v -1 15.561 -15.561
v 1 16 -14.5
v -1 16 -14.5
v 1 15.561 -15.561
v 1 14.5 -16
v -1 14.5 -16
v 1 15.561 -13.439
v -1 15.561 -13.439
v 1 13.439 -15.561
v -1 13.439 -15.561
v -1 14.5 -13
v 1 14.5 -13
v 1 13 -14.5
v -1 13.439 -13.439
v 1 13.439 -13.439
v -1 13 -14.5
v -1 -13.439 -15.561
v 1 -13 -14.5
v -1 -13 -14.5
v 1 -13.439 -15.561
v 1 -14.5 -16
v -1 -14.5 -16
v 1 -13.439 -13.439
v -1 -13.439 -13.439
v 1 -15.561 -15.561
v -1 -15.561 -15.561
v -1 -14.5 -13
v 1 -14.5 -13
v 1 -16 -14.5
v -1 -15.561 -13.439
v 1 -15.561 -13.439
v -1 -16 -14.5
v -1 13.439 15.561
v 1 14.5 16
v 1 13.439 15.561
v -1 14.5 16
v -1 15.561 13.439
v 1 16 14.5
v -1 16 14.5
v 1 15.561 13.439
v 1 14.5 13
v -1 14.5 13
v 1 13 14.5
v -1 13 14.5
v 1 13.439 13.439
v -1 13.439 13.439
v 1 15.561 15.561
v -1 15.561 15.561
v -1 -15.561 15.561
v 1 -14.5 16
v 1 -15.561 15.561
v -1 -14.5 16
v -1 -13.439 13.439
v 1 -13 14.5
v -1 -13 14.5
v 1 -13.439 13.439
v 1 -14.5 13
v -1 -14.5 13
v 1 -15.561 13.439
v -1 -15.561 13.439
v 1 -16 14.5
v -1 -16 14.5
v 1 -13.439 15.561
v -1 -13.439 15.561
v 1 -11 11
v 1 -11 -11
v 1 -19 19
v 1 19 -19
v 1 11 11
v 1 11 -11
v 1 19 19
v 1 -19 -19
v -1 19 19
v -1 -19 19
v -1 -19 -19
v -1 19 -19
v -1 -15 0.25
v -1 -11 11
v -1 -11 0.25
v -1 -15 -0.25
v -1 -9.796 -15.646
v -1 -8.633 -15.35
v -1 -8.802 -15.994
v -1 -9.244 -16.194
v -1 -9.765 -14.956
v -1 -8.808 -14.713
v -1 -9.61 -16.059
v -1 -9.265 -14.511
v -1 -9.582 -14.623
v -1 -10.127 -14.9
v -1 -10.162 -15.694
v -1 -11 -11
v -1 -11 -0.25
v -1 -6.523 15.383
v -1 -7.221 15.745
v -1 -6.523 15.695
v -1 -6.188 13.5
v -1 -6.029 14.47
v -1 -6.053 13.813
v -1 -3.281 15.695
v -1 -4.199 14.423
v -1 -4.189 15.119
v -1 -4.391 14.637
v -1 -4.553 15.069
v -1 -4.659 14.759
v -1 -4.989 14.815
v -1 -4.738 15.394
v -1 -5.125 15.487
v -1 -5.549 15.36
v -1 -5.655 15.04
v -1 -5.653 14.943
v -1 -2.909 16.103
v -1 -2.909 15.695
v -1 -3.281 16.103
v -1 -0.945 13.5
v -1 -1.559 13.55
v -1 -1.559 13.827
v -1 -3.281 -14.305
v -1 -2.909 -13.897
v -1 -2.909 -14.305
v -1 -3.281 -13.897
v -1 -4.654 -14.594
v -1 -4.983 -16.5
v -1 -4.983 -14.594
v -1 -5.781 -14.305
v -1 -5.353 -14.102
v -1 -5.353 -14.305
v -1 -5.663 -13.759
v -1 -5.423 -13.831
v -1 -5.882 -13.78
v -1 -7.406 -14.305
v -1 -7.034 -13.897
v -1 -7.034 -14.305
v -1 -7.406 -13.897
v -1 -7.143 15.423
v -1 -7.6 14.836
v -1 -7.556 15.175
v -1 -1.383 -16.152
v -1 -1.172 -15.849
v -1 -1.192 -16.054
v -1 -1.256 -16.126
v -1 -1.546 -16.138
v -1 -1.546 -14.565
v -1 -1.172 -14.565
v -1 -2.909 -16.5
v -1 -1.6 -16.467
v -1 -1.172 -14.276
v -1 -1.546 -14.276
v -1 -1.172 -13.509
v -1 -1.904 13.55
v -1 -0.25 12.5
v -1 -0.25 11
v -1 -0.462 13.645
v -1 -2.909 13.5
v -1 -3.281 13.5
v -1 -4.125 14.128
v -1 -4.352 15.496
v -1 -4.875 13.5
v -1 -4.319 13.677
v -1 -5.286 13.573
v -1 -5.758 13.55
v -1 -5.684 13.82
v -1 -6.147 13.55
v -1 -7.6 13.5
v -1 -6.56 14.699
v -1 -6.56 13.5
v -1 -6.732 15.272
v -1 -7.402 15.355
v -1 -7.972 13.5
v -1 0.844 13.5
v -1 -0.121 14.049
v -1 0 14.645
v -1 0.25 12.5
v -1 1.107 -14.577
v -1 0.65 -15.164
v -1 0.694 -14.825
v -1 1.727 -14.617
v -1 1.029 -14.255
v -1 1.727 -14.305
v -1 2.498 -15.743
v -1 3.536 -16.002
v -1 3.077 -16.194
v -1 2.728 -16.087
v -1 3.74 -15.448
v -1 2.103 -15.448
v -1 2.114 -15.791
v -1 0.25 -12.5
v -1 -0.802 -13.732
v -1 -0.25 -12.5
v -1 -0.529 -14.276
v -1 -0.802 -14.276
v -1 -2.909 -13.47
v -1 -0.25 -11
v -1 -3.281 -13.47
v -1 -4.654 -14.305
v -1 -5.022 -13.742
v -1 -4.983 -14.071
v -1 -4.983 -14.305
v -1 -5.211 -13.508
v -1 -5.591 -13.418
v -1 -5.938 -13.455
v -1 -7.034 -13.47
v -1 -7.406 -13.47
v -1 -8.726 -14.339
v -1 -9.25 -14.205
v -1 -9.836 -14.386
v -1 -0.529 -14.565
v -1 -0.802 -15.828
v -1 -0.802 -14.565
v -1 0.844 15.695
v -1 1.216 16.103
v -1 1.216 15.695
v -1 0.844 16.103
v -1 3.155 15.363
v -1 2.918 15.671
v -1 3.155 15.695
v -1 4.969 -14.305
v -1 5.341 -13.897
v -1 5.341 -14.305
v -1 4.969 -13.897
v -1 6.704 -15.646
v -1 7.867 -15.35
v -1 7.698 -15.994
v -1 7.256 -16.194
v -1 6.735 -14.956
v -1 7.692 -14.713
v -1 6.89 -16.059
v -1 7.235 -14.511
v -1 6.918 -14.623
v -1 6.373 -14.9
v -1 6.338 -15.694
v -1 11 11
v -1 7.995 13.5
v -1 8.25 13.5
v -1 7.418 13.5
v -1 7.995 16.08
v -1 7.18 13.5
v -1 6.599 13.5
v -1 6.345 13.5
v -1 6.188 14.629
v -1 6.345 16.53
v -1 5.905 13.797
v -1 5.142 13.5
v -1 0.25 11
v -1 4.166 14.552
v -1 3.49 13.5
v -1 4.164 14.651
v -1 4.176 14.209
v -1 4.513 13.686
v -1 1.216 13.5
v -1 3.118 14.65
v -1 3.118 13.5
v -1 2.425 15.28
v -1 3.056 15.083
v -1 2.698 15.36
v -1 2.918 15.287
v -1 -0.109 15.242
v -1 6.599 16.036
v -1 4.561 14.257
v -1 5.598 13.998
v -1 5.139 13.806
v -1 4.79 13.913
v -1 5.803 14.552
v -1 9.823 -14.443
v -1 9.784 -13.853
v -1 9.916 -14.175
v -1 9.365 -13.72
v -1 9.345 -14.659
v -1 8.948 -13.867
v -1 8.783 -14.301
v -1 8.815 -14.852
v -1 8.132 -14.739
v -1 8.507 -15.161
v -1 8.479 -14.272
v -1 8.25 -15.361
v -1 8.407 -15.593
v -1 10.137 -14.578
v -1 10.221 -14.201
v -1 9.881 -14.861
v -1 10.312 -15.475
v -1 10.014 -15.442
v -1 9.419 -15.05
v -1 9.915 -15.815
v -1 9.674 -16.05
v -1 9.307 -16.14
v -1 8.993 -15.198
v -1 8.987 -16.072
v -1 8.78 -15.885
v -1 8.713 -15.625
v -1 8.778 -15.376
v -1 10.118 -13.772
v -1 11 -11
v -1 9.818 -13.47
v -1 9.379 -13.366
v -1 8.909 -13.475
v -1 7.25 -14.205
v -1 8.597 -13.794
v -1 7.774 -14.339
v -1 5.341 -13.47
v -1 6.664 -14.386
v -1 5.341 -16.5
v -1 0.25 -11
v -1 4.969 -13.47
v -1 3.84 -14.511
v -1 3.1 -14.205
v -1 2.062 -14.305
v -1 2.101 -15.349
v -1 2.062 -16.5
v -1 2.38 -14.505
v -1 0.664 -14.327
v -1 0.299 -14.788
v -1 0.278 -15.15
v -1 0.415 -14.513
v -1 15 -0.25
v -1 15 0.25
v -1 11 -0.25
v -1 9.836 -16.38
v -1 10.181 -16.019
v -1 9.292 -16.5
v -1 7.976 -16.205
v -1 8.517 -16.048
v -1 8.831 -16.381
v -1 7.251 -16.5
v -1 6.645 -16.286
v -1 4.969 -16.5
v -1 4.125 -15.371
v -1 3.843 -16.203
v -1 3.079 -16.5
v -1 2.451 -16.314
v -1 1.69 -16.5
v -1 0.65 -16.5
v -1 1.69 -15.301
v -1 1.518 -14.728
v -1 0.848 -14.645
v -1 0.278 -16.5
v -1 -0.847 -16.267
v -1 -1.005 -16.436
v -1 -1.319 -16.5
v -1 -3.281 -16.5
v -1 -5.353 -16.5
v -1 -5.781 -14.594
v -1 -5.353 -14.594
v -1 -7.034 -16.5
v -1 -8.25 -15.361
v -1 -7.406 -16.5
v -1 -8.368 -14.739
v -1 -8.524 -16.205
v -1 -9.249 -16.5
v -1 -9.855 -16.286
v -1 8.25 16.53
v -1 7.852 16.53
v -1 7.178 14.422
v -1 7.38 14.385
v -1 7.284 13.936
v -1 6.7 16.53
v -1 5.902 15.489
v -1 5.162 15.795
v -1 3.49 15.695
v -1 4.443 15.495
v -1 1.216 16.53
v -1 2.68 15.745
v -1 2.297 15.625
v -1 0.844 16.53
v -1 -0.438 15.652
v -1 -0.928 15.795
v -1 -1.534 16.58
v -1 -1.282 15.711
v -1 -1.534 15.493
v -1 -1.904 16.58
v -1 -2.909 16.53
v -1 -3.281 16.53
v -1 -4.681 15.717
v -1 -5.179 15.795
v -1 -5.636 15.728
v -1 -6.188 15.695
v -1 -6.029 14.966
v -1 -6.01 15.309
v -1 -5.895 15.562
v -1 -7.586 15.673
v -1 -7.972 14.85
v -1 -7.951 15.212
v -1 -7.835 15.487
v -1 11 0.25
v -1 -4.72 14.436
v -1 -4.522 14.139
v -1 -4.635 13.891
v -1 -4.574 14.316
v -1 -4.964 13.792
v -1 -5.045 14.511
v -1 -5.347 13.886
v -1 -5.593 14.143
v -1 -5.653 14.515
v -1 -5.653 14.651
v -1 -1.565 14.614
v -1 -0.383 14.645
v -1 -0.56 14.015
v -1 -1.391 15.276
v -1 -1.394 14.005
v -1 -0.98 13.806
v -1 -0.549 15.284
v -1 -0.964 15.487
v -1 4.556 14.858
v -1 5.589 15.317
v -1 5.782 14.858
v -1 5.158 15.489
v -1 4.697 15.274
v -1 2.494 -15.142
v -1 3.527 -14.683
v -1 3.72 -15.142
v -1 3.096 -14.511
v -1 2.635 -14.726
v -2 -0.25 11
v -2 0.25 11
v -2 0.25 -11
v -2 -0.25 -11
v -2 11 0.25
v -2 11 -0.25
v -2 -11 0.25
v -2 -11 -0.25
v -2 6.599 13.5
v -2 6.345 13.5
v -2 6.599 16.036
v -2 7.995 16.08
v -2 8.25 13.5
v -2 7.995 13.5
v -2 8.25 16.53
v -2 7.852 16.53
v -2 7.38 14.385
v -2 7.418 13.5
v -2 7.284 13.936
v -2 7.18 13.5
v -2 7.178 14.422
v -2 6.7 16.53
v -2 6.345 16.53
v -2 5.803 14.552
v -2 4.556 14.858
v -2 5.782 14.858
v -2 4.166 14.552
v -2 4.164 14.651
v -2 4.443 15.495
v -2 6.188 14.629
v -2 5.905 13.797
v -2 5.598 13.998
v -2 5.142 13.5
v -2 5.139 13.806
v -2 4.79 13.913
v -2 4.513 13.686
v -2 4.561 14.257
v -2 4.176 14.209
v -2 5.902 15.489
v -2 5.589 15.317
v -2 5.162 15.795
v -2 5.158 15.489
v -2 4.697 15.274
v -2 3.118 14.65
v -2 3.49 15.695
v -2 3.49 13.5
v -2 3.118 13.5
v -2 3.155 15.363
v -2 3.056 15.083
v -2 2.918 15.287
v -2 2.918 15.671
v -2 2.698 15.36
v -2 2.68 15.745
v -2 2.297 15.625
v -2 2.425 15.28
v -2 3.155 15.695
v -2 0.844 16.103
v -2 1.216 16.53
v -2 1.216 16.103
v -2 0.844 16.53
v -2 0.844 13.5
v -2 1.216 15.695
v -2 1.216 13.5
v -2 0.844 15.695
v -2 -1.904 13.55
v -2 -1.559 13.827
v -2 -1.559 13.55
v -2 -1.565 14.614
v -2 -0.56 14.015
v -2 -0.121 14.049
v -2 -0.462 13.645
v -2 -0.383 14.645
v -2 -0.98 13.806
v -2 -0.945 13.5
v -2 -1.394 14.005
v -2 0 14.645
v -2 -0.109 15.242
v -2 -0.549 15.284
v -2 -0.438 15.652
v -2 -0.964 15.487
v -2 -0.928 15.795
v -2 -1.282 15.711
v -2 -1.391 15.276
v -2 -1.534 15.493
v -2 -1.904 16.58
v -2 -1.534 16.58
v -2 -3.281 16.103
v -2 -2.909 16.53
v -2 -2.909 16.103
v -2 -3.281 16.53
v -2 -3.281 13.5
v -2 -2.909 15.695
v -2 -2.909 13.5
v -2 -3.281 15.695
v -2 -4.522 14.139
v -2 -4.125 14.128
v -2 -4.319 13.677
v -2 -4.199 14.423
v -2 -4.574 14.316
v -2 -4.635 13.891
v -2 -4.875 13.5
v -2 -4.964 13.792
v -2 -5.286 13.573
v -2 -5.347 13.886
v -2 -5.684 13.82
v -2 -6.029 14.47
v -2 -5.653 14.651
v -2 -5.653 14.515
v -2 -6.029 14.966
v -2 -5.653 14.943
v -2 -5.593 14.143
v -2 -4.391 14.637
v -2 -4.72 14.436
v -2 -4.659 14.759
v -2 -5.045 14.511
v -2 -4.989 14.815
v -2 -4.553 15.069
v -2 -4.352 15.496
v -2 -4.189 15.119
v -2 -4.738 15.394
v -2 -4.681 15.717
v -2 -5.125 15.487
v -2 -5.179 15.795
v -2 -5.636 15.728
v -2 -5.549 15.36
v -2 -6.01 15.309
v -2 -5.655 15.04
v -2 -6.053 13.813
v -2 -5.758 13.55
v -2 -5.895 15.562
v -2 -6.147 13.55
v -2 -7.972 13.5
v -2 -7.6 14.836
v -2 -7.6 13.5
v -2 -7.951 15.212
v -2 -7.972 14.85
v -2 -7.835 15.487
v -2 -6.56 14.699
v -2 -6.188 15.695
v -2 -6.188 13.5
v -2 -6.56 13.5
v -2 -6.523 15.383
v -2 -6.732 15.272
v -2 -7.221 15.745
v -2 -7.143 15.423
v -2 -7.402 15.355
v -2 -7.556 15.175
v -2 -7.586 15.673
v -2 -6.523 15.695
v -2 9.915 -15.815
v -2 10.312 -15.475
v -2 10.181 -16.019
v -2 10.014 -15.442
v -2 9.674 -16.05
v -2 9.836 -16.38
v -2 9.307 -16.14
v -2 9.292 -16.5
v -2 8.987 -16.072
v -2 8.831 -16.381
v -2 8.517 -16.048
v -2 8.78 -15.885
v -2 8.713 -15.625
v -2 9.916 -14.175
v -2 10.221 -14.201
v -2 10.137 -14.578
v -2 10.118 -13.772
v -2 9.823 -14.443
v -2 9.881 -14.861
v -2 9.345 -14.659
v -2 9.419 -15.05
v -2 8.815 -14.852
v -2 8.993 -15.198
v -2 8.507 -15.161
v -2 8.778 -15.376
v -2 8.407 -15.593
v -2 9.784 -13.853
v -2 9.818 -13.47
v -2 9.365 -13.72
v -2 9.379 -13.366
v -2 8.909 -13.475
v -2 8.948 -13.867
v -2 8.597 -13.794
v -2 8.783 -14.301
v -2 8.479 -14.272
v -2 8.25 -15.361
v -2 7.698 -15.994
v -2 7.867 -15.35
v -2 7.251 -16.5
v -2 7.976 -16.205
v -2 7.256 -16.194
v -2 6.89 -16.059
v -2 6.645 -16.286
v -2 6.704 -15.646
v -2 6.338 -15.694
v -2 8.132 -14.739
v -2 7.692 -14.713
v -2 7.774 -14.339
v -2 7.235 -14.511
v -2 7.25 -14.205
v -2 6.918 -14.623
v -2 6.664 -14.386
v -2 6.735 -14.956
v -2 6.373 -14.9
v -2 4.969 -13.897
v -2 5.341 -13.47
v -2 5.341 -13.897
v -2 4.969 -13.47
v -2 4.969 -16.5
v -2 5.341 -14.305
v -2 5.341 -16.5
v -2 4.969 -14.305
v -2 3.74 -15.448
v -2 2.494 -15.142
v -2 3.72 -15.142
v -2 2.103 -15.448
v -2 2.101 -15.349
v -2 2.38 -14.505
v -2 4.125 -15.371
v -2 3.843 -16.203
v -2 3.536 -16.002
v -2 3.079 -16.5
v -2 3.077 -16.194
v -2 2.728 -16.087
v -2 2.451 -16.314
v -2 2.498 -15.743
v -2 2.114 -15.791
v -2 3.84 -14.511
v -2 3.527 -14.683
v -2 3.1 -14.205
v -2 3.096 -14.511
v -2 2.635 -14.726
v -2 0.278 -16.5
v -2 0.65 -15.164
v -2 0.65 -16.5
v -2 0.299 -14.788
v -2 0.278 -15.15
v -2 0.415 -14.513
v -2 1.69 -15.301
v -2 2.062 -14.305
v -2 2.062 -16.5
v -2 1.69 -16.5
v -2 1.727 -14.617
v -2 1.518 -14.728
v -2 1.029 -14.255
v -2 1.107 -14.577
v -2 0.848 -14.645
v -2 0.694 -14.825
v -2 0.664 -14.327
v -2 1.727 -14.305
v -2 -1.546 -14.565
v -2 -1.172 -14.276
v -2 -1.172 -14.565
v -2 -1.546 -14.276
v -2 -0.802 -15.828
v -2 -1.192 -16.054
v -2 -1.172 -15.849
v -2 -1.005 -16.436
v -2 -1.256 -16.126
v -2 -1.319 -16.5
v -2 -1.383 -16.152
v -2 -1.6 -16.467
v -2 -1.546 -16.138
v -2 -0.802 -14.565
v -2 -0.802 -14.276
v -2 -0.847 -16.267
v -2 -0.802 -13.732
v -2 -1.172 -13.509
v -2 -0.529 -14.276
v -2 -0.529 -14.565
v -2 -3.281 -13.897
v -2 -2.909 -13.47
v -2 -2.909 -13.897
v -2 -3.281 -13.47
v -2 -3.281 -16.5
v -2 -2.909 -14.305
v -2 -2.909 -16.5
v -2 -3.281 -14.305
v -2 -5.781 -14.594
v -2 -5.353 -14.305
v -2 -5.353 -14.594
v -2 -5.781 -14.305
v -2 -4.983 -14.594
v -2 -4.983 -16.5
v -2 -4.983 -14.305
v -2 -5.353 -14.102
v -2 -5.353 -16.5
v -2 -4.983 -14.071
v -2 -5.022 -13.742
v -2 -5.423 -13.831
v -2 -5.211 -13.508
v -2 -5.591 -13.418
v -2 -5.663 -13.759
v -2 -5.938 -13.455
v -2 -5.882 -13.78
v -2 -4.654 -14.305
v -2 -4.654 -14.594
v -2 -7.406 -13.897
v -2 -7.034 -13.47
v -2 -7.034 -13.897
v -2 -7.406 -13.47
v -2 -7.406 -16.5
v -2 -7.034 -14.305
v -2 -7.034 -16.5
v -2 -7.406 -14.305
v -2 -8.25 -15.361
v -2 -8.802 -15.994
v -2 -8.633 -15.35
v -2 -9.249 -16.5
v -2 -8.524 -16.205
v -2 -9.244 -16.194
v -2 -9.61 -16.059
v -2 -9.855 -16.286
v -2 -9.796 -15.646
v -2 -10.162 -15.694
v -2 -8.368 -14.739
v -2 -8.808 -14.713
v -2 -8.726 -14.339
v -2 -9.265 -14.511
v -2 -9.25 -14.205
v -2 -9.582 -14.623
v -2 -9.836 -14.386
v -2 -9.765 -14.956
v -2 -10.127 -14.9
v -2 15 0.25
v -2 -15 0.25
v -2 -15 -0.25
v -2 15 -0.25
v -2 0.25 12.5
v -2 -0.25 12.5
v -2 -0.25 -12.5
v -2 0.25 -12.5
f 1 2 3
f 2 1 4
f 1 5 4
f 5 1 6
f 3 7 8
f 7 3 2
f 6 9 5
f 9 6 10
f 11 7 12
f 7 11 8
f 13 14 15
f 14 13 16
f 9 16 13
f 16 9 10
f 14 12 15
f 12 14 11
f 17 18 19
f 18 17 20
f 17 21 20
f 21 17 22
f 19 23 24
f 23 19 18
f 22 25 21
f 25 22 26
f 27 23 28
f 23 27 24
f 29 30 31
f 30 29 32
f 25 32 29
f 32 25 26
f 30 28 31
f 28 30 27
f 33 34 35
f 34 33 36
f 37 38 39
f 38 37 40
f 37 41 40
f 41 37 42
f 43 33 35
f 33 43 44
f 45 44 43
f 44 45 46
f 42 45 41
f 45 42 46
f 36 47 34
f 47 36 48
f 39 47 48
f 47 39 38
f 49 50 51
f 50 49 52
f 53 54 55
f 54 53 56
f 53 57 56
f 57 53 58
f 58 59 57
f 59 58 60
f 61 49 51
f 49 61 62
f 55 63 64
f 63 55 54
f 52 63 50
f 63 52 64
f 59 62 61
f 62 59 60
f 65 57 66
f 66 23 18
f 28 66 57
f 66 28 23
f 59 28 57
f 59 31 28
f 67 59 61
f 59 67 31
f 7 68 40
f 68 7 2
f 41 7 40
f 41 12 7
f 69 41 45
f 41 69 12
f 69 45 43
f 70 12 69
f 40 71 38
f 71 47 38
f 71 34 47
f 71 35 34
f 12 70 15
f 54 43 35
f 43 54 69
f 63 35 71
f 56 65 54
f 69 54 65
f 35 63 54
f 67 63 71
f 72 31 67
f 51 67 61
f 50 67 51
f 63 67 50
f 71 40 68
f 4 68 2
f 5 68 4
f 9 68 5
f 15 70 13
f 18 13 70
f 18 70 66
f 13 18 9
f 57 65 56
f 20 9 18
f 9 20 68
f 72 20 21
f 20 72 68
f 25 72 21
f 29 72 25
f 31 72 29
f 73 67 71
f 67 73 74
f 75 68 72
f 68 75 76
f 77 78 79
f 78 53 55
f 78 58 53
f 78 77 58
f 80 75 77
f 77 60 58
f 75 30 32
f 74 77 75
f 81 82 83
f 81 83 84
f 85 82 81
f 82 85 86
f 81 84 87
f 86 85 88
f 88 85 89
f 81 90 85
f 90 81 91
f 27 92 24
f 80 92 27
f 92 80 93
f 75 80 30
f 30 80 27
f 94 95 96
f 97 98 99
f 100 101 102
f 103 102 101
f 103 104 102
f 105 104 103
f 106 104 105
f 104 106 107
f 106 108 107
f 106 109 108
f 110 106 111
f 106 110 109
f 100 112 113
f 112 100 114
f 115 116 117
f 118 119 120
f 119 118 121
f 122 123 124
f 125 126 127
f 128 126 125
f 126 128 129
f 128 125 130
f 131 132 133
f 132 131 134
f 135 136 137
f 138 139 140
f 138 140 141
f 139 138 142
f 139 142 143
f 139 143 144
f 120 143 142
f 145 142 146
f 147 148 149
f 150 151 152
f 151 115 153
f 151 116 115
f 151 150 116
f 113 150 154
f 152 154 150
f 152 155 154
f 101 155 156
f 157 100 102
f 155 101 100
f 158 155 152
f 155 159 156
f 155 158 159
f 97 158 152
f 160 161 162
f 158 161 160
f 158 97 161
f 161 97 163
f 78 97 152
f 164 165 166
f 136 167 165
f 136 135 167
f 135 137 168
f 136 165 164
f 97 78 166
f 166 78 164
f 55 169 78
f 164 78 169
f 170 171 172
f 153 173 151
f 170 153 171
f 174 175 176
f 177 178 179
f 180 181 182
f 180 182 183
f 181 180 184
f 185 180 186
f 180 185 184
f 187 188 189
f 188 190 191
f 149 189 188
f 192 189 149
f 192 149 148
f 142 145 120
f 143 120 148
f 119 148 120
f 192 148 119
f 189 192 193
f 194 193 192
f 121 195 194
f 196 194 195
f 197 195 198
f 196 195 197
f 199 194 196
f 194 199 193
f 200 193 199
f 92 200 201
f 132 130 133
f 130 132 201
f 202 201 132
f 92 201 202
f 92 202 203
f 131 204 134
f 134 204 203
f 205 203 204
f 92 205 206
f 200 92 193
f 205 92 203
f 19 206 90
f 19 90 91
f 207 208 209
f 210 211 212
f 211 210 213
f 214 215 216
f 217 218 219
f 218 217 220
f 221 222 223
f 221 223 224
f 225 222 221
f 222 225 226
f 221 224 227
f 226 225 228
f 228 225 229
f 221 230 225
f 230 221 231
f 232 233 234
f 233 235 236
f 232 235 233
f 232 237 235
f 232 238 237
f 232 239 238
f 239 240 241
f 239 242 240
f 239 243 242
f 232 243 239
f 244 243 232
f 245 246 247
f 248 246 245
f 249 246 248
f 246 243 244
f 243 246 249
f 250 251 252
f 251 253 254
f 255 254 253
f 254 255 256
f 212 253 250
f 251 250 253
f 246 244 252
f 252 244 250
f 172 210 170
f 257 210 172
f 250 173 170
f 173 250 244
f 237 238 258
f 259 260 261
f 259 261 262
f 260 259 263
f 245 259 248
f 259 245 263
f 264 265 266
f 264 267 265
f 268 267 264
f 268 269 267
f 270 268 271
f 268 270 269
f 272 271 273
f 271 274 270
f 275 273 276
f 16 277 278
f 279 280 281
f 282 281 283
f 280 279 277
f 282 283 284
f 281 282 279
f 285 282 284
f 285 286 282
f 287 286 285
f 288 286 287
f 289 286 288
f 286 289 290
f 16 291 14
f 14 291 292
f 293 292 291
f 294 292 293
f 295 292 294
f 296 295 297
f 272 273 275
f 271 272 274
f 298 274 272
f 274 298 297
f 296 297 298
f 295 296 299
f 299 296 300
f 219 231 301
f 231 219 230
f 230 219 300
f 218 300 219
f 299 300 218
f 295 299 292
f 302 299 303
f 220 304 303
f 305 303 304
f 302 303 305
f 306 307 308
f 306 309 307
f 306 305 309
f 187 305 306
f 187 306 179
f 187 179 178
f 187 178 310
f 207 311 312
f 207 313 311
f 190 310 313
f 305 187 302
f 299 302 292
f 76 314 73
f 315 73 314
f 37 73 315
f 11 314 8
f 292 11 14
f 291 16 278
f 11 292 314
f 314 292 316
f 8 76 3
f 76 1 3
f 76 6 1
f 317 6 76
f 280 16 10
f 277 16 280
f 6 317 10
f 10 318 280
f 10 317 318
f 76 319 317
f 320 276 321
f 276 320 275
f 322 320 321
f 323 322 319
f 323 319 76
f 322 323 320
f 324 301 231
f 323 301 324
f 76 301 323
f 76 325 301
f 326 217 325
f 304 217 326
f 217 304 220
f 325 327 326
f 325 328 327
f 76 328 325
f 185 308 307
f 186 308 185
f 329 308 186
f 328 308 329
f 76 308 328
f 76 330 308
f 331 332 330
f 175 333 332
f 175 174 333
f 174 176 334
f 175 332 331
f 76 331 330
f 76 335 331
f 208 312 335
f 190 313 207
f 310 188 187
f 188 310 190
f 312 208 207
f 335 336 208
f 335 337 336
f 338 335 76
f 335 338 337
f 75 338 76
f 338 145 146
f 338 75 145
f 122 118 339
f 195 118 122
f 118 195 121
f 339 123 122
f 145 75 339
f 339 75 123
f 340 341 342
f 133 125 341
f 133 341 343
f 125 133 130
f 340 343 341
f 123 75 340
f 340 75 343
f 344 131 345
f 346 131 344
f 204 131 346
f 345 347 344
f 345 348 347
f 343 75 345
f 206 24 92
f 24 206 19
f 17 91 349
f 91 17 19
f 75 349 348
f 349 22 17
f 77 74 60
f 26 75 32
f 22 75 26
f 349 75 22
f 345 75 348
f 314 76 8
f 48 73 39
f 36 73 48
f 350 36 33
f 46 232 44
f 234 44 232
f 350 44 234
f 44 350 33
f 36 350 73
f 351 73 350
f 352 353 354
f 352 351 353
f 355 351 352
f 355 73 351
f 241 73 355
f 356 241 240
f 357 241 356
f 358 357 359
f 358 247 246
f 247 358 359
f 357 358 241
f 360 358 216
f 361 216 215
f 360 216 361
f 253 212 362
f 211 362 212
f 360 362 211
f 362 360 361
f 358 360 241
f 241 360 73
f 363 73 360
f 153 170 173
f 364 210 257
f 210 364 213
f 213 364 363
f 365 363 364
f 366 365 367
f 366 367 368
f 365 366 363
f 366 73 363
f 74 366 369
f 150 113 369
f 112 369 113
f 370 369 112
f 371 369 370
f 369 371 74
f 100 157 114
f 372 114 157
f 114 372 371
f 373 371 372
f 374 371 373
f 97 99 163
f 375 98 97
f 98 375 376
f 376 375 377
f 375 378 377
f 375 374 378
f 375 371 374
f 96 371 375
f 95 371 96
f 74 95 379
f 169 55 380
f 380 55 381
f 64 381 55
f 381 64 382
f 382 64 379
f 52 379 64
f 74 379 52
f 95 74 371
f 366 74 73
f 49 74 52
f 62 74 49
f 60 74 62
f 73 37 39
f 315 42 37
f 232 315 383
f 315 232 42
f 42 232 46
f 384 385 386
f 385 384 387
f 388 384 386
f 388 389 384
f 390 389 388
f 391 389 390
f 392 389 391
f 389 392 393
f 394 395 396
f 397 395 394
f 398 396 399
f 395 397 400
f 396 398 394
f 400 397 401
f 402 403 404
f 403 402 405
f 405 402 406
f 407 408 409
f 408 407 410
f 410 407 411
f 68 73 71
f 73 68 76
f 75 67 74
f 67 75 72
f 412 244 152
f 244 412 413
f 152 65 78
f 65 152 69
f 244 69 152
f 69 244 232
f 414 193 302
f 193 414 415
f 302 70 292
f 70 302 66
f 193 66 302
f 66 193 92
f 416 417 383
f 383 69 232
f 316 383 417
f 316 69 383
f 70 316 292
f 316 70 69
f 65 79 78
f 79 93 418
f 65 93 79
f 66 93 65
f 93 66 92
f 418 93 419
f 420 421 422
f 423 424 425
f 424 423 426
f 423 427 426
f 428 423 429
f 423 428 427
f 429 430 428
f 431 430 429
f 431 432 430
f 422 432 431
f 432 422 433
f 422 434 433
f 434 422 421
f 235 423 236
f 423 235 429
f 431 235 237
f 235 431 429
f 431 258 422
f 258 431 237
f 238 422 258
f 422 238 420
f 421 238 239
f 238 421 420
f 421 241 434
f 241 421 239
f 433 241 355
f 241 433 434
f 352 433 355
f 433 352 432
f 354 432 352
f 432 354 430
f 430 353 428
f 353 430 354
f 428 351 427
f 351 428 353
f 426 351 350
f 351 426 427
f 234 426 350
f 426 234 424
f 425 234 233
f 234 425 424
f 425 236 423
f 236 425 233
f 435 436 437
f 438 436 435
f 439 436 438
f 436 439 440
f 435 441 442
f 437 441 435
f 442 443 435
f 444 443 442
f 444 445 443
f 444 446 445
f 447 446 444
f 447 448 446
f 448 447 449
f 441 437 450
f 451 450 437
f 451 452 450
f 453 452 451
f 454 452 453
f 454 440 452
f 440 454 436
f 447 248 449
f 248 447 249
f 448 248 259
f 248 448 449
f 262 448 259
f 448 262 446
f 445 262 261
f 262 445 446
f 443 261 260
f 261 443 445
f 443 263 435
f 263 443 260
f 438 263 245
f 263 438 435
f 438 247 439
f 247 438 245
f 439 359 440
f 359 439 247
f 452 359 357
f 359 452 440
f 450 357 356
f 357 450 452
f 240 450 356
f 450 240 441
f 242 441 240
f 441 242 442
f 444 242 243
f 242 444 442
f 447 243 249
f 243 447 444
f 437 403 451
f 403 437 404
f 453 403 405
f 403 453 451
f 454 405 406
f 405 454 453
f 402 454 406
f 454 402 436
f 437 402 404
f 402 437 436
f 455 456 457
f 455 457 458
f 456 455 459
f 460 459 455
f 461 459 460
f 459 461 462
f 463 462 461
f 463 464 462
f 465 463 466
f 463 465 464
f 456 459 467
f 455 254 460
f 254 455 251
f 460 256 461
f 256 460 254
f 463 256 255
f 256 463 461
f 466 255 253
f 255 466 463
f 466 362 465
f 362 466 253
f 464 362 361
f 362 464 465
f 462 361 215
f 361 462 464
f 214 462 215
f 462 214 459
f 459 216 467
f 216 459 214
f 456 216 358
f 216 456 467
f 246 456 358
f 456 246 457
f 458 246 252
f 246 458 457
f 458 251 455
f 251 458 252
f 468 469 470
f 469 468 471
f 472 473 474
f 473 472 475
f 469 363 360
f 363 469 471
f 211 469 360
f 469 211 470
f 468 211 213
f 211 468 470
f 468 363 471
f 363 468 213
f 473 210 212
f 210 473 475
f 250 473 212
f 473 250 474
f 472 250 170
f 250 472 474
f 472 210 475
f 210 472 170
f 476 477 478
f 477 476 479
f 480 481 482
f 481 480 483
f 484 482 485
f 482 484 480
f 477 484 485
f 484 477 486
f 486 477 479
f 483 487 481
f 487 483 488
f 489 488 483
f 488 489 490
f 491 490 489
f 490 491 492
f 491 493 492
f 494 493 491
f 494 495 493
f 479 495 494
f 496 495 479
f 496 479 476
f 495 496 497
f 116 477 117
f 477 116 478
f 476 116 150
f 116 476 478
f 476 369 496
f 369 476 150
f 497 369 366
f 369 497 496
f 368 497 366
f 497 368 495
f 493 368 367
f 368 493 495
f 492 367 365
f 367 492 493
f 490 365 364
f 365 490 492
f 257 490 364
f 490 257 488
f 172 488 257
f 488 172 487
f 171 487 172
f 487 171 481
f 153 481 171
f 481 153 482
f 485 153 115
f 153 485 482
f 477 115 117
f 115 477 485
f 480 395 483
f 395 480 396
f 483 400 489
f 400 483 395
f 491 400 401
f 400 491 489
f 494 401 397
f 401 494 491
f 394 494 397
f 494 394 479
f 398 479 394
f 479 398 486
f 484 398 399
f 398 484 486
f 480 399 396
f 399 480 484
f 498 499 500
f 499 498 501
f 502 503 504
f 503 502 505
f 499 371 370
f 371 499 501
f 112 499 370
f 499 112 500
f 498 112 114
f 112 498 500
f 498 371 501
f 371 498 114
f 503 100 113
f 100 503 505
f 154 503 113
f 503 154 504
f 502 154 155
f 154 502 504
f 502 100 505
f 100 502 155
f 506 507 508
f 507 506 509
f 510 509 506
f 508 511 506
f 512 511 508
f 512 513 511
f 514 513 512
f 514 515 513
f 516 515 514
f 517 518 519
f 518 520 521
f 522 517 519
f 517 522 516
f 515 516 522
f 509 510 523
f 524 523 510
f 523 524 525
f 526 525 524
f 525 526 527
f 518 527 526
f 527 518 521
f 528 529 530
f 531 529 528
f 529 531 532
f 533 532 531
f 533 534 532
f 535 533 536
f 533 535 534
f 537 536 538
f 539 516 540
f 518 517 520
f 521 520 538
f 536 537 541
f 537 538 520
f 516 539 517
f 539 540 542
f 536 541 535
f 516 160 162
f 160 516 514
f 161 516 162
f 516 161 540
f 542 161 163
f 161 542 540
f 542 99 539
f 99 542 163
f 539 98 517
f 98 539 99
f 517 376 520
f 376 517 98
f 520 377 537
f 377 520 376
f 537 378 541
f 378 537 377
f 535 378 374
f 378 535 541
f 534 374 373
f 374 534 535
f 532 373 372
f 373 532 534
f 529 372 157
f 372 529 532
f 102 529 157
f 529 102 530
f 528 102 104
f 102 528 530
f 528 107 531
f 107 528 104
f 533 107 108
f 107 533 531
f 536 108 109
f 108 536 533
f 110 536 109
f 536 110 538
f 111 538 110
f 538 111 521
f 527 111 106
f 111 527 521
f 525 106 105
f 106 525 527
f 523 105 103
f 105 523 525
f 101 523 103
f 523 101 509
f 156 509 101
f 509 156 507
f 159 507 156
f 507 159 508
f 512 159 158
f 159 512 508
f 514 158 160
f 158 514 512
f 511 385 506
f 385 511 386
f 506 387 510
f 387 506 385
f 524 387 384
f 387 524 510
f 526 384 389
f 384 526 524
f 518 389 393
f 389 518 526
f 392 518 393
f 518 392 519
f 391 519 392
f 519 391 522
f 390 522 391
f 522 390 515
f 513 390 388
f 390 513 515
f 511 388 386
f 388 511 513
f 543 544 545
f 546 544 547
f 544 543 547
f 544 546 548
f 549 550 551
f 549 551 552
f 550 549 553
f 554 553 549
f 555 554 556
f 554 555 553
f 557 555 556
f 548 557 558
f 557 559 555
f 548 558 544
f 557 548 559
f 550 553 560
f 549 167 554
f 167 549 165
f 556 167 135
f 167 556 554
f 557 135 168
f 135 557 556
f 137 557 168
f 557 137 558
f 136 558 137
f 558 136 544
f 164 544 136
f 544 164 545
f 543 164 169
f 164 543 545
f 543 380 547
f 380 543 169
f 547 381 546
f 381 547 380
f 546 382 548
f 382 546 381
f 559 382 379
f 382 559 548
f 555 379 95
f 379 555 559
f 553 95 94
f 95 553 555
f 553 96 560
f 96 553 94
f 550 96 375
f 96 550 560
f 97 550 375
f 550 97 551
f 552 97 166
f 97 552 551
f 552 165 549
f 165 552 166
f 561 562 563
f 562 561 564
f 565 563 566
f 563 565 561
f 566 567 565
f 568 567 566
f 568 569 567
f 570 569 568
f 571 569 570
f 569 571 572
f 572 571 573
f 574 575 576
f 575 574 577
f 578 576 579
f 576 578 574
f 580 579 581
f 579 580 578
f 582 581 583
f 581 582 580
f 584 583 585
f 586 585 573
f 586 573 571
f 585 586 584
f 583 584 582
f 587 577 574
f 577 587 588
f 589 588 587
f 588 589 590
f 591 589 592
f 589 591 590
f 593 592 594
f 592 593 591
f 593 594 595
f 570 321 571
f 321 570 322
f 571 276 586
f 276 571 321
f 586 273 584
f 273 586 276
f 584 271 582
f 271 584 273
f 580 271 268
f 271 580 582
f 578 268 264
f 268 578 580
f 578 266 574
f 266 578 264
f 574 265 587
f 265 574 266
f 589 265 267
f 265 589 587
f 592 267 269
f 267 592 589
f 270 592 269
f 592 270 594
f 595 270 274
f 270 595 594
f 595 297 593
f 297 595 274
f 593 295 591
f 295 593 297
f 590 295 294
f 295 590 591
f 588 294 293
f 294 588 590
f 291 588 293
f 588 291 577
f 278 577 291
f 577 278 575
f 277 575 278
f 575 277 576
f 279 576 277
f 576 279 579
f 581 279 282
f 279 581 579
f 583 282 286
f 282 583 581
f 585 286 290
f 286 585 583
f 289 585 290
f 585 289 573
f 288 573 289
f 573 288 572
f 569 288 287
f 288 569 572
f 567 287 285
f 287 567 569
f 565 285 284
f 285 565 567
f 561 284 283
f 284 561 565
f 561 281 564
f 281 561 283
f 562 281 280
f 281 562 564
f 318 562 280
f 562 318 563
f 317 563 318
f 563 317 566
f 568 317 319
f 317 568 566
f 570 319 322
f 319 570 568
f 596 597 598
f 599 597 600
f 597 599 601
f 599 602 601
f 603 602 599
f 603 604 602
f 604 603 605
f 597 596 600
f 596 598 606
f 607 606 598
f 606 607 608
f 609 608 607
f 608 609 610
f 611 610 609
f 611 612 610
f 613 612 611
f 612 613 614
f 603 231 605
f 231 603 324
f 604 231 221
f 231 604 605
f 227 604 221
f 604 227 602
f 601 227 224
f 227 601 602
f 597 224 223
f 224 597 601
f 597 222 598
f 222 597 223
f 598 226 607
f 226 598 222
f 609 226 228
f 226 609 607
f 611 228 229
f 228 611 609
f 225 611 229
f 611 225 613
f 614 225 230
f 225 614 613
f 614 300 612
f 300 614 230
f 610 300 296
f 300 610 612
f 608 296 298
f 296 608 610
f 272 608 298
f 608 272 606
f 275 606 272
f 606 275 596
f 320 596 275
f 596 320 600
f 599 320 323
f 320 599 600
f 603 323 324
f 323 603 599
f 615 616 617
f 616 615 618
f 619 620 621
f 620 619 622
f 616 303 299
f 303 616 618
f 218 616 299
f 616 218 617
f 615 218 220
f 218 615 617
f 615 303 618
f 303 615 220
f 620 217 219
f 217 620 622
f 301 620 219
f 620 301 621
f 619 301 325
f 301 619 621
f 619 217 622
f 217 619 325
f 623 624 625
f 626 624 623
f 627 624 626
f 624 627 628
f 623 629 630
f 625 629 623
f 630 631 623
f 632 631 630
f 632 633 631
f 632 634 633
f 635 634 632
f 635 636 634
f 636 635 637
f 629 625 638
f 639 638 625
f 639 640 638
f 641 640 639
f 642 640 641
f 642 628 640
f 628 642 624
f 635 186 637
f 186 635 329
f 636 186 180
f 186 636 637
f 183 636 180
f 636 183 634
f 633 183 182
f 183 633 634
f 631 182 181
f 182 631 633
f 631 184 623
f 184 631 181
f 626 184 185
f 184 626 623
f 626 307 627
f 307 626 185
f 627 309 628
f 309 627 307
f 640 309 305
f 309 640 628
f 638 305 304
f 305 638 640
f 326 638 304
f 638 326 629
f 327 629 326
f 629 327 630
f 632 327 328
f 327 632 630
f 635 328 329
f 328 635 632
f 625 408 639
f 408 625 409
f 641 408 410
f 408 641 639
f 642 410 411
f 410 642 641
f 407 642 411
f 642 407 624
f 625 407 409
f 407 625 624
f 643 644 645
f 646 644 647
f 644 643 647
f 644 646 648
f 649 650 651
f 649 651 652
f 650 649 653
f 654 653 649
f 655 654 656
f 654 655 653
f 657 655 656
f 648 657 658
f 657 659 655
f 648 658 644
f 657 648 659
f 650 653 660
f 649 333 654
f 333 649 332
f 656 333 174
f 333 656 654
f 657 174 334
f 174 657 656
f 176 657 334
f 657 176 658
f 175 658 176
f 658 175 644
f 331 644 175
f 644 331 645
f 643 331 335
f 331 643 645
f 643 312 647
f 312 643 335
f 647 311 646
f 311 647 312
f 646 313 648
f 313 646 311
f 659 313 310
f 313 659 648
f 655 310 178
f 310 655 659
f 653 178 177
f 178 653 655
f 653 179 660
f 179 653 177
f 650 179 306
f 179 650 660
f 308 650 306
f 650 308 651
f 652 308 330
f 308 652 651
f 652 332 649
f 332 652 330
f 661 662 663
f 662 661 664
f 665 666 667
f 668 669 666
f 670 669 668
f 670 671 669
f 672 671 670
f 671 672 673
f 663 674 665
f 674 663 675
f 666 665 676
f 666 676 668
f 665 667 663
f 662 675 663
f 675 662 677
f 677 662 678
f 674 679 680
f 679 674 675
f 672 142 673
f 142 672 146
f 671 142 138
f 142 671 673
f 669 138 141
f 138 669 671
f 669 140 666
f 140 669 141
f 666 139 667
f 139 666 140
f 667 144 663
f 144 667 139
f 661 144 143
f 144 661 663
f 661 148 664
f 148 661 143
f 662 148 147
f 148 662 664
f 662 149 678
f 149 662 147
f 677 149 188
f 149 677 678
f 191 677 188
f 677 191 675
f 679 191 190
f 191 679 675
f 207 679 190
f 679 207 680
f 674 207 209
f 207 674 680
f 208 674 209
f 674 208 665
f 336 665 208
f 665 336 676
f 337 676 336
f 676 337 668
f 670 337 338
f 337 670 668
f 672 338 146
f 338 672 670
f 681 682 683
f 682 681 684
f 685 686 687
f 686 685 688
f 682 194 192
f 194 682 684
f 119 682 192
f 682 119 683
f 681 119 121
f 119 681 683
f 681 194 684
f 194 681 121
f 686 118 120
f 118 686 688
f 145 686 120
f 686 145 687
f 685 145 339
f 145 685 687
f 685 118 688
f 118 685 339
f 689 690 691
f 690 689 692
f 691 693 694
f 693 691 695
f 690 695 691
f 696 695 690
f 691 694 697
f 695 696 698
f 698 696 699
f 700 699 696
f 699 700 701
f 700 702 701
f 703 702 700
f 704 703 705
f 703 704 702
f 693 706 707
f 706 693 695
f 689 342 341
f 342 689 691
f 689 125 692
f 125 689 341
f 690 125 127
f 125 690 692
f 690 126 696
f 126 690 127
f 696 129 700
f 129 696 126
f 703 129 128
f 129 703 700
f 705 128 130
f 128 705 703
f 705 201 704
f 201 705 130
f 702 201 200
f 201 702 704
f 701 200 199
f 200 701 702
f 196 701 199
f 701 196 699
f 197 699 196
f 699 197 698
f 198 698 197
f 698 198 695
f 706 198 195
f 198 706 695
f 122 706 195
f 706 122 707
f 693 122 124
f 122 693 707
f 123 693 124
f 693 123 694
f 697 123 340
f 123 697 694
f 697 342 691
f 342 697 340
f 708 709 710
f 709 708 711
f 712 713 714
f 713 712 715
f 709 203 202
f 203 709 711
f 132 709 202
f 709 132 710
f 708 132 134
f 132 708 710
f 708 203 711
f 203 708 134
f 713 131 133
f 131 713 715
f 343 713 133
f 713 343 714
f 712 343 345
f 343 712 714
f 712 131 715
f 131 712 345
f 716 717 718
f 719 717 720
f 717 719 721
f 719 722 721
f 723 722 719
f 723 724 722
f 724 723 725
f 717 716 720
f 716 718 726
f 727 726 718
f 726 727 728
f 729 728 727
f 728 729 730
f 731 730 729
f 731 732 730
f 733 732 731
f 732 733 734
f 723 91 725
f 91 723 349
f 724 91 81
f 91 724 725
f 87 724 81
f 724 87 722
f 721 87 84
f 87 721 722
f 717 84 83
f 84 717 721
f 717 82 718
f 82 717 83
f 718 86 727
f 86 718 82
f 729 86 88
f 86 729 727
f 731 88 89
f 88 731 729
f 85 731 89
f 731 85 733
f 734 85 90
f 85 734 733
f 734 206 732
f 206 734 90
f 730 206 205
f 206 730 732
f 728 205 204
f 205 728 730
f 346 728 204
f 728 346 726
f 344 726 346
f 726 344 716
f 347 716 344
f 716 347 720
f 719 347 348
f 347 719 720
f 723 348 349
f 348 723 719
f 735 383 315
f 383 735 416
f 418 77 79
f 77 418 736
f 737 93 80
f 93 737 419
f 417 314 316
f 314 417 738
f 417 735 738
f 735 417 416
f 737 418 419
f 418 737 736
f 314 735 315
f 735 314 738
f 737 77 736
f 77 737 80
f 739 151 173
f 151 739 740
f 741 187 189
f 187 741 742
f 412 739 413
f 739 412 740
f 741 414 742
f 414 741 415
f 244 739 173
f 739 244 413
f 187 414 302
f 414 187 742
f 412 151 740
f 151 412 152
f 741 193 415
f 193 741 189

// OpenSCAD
use <write.scad>

module retainingBracket(){
	difference(){	
		translate([0,0,0]) color([.7,.9,.2]) cube(size=[2,38,38],center=true);
		translate([0,0,0]) cube(size=[6,22,22],center=true);
		rotate([0,90,0]){
			translate([14.5,14.5,0]) cylinder(h=5,r=1.5,$fn=8,center=true);			
			translate([14.5,-14.5,0]) cylinder(h=5,r=1.5,$fn=8,center=true);			
			translate([-14.5,14.5,0]) cylinder(h=5,r=1.5,$fn=8,center=true);			
			translate([-14.5,-14.5,0]) cylinder(h=5,r=1.5,$fn=8,center=true);		
		}
	}
	rotate([90,0,-90]){
		translate([0,15,1]){
			write("Meridian",h=3,t=2,center=true);
		}
	}
	rotate([90,0,-90]){
		translate([0,-15,1]){
			write("Scientific",h=3,t=2,center=true);
		}
	}
	difference(){
		translate([-1,0,0]) cube(size=[2,30,.5],center=true);	
		translate([0,0,0]) cube(size=[6,22,22],center=true);
	}
	difference(){
		translate([-1,0,0]) cube(size=[2,.5,25],center=true);	
		translate([0,0,0]) cube(size=[6,22,22],center=true);
	}
}

retainingBracket();
